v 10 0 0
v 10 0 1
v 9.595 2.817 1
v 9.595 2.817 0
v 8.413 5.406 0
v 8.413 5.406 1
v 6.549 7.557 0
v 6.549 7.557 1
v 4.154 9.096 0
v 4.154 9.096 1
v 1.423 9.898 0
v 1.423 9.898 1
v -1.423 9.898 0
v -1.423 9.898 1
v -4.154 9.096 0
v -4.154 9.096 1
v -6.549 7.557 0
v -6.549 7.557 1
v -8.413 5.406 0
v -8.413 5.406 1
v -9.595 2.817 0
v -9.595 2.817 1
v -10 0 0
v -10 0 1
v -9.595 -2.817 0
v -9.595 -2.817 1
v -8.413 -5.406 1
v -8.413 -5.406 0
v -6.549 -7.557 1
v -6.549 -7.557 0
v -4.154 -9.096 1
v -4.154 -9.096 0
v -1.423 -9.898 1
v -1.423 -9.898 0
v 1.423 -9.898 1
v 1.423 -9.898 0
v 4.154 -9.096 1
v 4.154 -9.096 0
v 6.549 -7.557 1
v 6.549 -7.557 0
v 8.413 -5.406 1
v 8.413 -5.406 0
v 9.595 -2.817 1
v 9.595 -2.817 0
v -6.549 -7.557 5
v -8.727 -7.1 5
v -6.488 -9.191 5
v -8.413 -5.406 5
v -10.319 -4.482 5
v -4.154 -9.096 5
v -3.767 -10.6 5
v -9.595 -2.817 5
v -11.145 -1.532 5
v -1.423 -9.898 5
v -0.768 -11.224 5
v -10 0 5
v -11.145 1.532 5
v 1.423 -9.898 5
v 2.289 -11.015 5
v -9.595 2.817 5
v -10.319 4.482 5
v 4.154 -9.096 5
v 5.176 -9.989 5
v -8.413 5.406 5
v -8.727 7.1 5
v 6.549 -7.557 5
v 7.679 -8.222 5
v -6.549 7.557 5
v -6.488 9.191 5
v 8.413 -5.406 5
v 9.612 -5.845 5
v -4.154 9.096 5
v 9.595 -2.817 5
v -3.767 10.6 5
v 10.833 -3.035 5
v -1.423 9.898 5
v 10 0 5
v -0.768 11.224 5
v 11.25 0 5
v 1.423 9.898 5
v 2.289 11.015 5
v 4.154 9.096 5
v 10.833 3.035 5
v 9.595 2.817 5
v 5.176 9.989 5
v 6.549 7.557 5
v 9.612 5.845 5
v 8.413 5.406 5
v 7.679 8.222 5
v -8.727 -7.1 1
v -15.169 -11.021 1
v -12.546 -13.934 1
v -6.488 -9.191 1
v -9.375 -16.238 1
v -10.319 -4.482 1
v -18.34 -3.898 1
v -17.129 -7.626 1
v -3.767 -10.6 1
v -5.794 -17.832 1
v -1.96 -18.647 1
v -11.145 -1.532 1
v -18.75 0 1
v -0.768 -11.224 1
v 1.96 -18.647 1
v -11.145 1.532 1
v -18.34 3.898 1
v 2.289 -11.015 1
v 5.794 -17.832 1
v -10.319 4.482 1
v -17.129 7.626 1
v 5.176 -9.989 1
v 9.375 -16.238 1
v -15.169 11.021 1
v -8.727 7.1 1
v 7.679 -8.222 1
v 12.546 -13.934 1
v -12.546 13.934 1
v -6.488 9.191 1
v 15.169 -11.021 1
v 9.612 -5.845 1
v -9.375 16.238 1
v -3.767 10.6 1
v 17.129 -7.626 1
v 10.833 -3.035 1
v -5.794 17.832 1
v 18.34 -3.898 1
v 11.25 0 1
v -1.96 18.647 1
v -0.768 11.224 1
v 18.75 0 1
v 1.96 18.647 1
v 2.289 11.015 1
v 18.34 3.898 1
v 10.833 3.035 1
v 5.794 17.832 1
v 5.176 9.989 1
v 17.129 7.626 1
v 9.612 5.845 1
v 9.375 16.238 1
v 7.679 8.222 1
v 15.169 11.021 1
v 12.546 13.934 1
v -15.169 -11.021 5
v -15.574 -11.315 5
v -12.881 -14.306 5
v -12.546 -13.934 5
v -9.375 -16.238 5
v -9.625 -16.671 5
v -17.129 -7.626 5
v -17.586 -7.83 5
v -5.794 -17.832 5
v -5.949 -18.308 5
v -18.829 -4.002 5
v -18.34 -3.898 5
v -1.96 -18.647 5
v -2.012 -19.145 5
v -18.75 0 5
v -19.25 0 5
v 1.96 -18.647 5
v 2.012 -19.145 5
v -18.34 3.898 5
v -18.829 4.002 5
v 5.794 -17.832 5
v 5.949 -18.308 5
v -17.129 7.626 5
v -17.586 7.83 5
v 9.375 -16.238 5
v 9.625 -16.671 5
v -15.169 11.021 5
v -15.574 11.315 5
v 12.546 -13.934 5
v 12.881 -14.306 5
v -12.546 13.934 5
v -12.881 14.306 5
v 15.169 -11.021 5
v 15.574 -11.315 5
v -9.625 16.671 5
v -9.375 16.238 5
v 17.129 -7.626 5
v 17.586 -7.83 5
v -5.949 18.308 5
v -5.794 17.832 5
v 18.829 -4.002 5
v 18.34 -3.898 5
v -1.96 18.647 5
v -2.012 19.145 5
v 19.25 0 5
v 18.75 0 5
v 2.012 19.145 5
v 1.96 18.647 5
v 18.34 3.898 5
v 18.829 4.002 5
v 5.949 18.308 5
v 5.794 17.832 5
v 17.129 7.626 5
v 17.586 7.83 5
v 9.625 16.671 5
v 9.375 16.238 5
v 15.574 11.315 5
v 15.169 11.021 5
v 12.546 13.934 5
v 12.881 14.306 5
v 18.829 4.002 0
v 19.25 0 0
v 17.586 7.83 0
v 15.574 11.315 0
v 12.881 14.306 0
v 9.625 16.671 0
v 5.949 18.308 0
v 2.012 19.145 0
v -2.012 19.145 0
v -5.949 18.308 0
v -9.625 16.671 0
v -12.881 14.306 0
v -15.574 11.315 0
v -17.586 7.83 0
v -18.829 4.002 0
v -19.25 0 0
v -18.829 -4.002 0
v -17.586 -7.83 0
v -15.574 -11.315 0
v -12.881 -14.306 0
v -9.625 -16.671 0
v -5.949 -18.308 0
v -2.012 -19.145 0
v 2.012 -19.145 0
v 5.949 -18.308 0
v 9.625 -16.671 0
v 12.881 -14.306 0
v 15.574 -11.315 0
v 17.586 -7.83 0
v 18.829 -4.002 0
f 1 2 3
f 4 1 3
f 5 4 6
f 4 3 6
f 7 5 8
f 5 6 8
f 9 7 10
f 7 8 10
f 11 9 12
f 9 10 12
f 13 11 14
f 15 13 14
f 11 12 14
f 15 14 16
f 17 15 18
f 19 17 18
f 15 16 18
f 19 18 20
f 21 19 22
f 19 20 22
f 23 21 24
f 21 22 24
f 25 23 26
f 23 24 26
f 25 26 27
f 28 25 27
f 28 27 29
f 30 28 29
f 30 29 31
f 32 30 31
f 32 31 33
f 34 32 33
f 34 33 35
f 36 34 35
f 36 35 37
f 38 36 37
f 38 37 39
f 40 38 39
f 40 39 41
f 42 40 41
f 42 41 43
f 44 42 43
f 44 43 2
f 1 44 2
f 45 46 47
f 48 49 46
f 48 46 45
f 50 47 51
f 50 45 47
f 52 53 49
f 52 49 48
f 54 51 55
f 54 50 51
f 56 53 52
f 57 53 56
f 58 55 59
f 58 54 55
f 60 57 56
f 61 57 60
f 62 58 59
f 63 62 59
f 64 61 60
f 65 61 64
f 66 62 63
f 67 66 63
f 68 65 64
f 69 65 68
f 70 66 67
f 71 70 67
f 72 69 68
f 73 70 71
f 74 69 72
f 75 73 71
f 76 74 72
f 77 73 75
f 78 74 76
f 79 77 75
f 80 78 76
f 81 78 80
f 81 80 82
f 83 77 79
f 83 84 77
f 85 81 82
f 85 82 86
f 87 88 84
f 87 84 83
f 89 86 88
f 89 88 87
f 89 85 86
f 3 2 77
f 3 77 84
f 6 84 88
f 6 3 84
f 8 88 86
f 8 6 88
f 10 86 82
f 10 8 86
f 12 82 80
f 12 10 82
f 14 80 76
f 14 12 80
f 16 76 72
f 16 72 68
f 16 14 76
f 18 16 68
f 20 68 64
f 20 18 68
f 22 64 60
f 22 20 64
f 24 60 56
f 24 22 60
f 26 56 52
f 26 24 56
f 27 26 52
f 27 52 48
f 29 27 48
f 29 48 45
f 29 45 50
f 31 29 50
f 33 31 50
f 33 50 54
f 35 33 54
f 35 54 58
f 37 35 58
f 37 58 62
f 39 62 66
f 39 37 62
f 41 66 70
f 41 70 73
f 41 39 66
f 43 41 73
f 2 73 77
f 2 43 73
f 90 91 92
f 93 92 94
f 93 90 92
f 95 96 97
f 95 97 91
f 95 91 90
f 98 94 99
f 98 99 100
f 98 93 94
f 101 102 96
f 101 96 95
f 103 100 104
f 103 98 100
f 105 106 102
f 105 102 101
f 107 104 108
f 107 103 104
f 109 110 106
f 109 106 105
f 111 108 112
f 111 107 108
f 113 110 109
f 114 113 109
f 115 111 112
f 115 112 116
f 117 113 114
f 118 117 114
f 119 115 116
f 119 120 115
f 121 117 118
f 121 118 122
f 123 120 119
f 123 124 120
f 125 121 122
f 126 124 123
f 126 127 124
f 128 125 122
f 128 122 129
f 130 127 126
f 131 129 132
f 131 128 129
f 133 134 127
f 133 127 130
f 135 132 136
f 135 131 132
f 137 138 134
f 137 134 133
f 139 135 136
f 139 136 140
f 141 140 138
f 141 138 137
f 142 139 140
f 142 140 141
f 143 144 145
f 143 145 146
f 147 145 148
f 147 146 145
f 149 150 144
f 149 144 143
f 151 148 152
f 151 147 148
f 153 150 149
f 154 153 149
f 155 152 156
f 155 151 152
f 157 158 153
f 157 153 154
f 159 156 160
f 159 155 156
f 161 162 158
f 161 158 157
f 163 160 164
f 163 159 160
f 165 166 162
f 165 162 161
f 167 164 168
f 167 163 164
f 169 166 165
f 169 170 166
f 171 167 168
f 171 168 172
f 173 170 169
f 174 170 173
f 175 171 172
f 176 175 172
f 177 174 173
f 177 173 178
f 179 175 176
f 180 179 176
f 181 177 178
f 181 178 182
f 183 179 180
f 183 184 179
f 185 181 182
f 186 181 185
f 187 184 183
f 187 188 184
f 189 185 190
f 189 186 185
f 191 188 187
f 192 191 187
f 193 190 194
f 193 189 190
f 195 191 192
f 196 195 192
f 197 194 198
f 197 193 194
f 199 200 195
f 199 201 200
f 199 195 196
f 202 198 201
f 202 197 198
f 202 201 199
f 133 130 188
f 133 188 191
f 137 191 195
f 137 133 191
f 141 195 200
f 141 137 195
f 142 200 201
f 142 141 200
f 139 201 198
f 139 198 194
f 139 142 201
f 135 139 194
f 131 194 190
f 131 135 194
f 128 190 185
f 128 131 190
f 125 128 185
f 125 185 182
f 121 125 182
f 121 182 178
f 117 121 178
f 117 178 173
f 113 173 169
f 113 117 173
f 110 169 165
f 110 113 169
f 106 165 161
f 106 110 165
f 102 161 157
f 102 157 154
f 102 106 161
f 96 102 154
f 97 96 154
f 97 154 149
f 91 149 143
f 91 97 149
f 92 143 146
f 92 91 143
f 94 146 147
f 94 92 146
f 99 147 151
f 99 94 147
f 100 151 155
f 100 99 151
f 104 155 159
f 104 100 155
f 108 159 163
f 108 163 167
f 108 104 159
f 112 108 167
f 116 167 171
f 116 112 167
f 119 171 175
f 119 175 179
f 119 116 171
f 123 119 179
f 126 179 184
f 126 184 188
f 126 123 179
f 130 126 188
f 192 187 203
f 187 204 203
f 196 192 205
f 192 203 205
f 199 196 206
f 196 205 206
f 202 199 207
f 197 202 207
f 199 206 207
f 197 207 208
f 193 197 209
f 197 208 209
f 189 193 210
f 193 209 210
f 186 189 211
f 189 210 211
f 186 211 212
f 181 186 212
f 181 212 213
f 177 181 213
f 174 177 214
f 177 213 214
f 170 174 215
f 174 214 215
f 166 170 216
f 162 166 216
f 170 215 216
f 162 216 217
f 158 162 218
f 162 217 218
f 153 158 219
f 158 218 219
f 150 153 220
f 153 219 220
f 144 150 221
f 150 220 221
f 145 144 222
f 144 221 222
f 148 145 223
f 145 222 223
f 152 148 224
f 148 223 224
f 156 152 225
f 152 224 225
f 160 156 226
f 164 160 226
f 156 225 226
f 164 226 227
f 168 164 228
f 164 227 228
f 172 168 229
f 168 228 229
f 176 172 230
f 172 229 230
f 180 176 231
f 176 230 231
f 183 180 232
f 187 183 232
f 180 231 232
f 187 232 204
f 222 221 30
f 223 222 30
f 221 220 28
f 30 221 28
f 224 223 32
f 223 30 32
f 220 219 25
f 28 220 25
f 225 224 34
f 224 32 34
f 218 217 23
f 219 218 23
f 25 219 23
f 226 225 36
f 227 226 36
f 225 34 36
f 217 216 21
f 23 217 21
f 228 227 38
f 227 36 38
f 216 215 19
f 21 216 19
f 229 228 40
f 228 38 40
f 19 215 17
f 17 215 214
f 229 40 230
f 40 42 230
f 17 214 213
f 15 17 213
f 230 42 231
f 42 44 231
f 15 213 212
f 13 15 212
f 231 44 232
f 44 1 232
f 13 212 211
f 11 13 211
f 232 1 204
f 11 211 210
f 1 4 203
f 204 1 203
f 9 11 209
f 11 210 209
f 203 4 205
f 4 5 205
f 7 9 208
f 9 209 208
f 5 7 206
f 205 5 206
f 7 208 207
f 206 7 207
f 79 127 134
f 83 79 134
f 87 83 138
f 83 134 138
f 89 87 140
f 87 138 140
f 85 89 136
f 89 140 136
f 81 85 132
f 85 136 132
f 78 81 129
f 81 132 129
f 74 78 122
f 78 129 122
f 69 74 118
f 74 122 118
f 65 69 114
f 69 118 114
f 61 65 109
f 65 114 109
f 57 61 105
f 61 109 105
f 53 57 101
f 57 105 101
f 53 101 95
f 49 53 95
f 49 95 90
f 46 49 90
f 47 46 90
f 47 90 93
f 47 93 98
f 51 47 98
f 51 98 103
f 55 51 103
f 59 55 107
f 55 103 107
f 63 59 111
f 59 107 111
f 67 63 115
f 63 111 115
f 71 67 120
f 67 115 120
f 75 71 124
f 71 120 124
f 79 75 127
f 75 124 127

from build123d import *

# Parameters (mm, degrees)
SKETCH1_R           = 19.25
BOSS_EXTRUDE1_DEPTH = 1
SKETCH2_R           = 11.25
SKETCH2_R_2         = 10
BOSS_EXTRUDE2_DEPTH = 4
SKETCH3_R           = 19.25
SKETCH3_R_2         = 18.75
BOSS_EXTRUDE3_DEPTH = 4
SKETCH5_R           = 10
CUT_EXTRUDE1_DEPTH  = 5


with BuildPart() as part:
    # Sketch1 → Boss-Extrude1 (new body)
    with BuildSketch(Plane.XY):
        Circle(SKETCH1_R)
    extrude(amount=BOSS_EXTRUDE1_DEPTH)

    # Sketch2 → Boss-Extrude2 (add)
    with BuildSketch(Plane.XY.offset(1)):
        Circle(SKETCH2_R)
        Circle(SKETCH2_R_2, mode=Mode.SUBTRACT)
    extrude(amount=BOSS_EXTRUDE2_DEPTH)

    # Sketch3 → Boss-Extrude3 (add)
    with BuildSketch(Plane.XY.offset(1)):
        Circle(SKETCH3_R)
        Circle(SKETCH3_R_2, mode=Mode.SUBTRACT)
    extrude(amount=BOSS_EXTRUDE3_DEPTH)

    # Sketch5 → Cut-Extrude1 (cut)
    with BuildSketch(Plane.XY.offset(1)):
        Circle(SKETCH5_R)
    extrude(amount=-CUT_EXTRUDE1_DEPTH, mode=Mode.SUBTRACT)


solid = part.part
